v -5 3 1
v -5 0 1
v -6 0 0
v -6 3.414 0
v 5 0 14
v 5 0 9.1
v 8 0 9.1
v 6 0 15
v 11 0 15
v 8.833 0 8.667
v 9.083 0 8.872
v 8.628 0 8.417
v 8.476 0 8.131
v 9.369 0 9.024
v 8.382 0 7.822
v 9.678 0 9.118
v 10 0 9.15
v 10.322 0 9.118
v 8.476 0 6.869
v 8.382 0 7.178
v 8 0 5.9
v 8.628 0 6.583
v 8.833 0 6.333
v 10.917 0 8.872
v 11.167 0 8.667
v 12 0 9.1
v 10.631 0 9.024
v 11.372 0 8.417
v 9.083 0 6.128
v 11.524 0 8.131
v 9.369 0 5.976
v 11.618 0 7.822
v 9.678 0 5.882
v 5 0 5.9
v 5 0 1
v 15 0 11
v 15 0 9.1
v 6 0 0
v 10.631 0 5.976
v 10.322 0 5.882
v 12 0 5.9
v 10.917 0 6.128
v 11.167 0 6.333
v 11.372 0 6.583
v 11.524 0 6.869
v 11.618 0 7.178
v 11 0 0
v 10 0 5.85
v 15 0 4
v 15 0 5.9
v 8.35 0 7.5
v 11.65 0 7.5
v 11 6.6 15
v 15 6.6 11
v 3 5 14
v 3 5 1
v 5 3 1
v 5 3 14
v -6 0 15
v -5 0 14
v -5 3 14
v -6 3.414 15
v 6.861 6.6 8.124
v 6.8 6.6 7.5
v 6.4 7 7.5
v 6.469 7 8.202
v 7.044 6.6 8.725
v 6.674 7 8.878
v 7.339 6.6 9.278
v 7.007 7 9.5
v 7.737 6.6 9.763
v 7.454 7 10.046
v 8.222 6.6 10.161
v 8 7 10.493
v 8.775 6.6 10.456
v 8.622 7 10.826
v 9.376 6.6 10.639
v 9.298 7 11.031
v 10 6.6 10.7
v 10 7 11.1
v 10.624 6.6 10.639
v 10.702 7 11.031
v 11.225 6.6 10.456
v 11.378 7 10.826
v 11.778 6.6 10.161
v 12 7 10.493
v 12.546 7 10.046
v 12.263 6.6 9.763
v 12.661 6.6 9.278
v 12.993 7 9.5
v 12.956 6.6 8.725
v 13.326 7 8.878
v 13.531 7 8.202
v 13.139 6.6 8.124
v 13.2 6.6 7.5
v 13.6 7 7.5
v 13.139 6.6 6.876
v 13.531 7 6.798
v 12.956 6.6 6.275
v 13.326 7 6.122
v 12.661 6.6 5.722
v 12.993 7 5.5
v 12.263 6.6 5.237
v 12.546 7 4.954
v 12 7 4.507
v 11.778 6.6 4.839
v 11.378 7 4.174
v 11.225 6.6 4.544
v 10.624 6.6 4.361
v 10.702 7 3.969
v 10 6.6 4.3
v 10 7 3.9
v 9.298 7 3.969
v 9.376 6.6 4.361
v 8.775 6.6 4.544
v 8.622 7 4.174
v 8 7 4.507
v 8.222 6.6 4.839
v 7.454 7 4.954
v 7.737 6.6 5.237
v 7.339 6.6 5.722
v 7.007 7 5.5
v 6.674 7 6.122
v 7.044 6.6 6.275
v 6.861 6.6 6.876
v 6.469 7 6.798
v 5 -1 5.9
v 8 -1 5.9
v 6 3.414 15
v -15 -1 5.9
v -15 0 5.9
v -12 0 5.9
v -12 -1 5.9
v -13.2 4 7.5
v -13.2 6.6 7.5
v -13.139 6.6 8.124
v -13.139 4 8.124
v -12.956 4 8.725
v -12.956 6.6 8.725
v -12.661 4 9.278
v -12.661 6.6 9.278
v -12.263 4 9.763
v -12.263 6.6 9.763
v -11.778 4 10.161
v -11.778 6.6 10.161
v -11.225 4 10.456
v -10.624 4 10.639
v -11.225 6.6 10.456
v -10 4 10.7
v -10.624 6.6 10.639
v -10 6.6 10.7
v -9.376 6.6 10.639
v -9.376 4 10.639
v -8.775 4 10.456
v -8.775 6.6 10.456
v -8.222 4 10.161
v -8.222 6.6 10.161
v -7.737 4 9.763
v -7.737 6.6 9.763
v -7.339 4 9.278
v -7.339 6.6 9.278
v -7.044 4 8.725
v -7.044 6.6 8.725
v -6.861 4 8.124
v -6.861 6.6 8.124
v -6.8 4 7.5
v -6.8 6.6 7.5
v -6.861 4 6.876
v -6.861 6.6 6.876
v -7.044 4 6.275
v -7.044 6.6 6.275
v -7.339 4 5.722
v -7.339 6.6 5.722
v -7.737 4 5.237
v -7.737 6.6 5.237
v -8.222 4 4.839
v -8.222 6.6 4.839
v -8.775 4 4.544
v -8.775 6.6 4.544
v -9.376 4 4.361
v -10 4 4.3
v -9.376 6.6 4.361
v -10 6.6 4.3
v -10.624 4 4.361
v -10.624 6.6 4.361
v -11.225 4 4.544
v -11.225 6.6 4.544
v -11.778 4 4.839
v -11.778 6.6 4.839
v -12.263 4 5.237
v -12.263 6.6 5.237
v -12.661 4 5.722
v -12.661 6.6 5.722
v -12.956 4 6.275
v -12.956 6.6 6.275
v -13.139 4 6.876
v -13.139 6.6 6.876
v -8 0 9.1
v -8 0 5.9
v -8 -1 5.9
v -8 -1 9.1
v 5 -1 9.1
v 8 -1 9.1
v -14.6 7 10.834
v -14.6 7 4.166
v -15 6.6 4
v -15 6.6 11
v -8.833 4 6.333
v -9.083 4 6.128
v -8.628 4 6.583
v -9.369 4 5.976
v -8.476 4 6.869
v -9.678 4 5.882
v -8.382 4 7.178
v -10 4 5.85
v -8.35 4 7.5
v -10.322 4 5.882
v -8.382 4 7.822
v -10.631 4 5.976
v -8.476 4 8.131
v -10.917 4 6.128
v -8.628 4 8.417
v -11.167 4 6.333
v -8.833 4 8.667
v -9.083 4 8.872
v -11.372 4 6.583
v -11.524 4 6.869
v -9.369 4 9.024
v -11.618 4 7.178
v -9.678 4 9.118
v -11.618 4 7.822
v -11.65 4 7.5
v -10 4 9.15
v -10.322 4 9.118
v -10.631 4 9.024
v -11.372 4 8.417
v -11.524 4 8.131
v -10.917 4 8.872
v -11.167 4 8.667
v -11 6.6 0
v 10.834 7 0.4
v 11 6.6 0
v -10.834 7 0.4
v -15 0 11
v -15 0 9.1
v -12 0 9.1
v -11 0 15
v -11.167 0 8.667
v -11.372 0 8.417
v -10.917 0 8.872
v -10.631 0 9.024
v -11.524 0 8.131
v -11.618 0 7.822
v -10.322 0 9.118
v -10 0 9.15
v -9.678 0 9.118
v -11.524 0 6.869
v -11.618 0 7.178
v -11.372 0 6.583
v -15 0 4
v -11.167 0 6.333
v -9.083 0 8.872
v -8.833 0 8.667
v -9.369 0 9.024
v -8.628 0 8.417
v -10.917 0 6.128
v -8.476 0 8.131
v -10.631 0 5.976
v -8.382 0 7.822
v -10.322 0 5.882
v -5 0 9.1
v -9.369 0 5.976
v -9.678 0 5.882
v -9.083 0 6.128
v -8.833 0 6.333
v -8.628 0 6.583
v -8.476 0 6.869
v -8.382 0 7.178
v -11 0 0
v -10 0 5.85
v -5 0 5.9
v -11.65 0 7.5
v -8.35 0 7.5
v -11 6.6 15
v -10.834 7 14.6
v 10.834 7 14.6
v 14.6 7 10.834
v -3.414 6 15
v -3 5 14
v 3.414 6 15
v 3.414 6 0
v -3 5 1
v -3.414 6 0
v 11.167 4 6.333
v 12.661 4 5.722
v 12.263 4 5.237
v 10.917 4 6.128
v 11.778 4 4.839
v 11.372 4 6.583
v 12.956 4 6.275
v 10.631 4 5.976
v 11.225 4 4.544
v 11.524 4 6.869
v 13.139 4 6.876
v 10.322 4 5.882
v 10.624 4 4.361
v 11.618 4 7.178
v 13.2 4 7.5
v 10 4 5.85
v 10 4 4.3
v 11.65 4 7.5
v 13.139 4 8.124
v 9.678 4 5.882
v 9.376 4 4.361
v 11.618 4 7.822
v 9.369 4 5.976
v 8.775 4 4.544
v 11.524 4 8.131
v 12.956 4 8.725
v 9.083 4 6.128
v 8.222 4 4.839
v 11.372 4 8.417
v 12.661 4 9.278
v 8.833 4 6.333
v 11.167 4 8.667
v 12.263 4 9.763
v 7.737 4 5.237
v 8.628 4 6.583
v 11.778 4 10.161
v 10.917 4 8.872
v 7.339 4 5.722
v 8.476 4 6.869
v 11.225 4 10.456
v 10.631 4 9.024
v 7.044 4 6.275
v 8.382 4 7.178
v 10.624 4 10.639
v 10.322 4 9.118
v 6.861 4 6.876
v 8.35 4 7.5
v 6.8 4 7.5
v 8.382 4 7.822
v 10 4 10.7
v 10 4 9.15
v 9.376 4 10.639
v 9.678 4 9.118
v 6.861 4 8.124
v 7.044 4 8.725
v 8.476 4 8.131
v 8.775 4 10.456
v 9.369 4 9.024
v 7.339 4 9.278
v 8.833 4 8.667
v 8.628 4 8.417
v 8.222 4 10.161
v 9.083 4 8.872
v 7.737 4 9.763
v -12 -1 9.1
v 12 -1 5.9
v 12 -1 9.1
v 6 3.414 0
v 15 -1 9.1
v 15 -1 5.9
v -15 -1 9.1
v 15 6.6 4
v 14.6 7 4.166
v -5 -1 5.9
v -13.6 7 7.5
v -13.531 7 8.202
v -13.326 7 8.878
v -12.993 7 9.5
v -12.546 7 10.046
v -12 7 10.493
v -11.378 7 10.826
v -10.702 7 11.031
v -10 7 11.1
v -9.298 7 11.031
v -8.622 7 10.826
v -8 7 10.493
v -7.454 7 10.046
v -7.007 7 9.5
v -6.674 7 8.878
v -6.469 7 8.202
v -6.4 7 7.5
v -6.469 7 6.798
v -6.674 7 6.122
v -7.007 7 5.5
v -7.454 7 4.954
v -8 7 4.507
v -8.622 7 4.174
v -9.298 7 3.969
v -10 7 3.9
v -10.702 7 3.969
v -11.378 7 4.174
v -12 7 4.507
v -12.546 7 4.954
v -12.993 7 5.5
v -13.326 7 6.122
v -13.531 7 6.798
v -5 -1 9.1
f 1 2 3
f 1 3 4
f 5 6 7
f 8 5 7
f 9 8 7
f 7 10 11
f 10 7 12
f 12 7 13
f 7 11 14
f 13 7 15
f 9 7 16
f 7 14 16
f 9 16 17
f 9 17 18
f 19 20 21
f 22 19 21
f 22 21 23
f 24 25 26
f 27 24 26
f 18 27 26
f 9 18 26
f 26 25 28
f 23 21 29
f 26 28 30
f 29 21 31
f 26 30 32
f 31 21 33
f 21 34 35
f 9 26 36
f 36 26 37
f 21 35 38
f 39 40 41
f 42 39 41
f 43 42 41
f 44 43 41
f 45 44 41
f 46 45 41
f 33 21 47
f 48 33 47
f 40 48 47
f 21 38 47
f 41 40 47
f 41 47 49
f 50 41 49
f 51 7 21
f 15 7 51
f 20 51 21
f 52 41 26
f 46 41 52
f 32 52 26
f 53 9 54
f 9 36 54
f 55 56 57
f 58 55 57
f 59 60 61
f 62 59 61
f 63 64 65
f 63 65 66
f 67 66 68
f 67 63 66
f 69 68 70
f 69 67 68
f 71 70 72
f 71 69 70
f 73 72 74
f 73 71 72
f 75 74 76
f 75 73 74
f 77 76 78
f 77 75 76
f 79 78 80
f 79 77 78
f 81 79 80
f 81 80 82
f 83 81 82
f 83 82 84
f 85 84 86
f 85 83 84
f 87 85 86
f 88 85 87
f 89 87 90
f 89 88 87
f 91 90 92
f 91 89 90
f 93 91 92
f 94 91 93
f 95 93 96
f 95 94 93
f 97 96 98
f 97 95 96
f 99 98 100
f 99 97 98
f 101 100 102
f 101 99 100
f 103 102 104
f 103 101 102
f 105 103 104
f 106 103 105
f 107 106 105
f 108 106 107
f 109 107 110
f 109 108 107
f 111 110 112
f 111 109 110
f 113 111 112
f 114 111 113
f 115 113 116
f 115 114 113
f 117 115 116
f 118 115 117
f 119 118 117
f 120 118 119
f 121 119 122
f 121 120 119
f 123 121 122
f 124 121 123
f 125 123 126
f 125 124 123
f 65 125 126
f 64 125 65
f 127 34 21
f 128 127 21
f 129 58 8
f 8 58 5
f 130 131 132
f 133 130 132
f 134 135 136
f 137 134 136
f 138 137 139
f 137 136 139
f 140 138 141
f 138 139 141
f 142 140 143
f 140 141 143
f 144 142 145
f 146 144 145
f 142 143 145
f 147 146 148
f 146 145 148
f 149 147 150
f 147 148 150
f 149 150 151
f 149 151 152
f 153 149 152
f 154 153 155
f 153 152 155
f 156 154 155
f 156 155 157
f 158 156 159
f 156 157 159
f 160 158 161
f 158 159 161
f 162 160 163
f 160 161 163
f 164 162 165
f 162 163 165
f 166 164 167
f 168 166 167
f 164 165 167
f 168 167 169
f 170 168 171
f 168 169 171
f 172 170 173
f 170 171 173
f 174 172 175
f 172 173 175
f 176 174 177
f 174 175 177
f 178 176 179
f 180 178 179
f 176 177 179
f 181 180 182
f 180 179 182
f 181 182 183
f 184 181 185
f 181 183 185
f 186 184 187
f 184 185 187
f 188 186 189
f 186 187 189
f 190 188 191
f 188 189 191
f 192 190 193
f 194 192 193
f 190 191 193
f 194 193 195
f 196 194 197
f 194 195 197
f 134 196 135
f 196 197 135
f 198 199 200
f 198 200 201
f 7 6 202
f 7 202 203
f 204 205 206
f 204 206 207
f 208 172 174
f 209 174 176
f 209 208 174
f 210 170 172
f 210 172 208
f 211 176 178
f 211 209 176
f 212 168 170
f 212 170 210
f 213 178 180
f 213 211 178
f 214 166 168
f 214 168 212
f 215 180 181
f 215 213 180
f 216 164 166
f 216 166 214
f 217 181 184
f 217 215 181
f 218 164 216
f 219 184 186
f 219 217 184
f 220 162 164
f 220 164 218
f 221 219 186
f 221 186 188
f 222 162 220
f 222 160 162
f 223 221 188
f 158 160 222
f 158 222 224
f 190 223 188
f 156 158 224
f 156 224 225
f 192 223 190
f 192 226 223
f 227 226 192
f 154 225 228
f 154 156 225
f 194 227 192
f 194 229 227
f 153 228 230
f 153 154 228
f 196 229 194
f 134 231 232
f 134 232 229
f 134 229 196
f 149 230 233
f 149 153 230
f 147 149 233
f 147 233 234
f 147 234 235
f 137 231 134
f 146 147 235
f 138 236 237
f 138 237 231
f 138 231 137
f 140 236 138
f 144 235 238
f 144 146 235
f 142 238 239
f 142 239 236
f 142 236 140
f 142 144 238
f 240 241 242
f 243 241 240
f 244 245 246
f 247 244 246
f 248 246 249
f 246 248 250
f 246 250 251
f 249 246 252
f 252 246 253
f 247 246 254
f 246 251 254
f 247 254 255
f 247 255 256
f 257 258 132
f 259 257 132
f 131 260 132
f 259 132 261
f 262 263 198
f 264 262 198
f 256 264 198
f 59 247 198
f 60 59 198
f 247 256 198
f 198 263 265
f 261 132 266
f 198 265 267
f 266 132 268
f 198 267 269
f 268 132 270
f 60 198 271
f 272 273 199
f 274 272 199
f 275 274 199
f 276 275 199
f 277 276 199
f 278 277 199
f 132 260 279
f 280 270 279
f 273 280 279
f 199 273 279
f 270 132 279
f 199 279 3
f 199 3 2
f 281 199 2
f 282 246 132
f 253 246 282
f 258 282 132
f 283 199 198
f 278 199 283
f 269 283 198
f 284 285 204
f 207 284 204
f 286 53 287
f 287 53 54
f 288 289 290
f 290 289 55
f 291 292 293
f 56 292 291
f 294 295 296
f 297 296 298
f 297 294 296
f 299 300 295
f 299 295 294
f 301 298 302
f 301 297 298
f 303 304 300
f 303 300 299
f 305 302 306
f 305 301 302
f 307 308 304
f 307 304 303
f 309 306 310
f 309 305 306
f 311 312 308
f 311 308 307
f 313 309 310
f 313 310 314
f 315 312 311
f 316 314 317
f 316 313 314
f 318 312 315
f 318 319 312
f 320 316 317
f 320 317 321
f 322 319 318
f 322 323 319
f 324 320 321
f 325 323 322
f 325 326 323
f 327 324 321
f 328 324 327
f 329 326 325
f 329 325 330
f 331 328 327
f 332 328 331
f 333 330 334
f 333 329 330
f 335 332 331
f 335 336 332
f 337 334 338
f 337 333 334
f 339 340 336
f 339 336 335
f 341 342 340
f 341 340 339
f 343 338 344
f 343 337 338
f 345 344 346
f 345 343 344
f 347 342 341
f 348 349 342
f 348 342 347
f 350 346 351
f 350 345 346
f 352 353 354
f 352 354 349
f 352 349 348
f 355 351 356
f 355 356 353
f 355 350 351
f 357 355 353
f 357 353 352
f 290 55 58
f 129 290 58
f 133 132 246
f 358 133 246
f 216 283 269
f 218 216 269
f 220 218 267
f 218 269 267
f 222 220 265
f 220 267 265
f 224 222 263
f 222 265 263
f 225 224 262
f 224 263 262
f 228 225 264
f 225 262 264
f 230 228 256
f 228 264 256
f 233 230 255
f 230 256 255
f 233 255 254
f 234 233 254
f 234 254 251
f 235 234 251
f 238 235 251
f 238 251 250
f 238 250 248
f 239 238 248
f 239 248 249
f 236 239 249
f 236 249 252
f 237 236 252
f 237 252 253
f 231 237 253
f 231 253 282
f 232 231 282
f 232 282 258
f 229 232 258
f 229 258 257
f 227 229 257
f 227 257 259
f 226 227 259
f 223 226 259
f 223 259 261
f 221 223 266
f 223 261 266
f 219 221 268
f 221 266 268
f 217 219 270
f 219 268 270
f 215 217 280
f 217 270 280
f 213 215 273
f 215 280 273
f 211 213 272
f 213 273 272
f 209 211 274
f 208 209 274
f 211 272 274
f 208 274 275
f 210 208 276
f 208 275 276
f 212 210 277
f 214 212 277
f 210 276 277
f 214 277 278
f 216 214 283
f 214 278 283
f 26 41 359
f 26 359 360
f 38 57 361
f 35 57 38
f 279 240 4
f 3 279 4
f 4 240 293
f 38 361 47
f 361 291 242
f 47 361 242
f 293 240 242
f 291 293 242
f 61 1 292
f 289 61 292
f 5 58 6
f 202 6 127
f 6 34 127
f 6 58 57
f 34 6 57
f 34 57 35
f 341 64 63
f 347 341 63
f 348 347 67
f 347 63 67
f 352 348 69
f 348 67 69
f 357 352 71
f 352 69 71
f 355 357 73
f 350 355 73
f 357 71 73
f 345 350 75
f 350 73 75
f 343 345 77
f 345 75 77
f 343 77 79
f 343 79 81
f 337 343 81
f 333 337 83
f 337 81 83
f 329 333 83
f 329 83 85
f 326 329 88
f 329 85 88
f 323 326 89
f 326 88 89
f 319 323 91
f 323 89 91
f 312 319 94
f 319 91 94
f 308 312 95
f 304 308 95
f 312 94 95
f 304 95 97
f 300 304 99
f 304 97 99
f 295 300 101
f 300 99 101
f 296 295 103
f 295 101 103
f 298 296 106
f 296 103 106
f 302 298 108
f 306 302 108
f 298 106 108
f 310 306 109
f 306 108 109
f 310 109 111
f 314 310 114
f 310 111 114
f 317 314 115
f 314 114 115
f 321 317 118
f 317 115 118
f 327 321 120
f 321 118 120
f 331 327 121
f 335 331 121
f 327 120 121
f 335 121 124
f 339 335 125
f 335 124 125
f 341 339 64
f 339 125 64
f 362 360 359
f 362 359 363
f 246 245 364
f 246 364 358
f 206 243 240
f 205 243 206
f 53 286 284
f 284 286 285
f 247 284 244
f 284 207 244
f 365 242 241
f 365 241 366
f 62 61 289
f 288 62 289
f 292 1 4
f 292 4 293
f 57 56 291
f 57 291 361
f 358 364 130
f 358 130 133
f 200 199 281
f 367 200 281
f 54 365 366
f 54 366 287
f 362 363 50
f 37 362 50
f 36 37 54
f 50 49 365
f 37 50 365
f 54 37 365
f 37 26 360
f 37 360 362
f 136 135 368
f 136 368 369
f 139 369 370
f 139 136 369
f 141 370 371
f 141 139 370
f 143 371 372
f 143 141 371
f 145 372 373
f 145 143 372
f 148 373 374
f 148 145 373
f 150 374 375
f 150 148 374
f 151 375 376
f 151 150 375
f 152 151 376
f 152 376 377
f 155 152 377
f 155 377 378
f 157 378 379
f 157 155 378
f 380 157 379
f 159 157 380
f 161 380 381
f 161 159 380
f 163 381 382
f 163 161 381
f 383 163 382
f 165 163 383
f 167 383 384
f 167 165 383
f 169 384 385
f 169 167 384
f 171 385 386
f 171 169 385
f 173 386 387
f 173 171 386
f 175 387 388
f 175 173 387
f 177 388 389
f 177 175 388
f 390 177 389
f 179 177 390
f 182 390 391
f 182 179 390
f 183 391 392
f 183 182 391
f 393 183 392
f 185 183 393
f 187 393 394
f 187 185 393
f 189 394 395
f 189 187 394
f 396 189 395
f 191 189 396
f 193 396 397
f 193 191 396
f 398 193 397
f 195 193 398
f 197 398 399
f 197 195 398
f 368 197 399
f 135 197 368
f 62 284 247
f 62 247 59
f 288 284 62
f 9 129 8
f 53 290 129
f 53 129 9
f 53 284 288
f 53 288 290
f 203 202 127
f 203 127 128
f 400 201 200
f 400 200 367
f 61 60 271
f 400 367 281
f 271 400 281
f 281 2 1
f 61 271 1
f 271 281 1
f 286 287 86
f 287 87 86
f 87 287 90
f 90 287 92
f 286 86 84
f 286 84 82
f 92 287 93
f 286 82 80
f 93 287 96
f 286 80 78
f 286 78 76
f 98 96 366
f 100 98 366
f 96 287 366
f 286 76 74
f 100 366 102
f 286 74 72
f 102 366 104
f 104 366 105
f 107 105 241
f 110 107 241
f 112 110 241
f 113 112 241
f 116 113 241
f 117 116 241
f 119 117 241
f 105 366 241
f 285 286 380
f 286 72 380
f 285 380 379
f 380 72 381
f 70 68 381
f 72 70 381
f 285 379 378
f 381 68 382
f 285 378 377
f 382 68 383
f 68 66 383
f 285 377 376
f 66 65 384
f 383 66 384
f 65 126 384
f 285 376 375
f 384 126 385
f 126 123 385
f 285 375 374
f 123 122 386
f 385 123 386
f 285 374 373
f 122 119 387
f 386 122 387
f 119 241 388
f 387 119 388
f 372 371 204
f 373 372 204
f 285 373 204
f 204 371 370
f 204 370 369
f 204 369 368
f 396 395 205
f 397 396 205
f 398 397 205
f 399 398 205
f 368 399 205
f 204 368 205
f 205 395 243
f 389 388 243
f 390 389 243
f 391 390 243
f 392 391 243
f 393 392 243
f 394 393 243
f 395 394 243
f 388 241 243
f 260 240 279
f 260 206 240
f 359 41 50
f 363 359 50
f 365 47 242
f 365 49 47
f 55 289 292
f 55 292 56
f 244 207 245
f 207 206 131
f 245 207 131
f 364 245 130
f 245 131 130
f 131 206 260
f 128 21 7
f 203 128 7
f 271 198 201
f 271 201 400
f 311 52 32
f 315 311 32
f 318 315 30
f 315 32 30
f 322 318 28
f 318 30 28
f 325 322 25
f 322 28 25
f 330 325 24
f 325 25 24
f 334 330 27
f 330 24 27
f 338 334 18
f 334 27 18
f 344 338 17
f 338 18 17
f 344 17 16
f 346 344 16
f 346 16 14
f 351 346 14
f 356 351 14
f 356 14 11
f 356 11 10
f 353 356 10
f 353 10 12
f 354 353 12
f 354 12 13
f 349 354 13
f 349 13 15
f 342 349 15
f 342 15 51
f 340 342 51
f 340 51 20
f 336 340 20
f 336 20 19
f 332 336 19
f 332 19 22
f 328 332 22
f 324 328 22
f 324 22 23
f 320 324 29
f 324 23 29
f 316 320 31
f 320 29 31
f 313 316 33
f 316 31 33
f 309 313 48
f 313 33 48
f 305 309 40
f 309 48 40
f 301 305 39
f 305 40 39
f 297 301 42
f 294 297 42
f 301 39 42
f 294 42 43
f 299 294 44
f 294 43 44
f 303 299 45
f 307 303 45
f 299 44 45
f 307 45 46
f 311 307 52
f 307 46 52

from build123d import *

# Parameters (mm, degrees)
PAD001_DEPTH                               = 15
SKETCH007_R                                = 1.65
POCKET005_DEPTH                            = 7.001
SKETCH008_R                                = 3.2
POCKET006_DEPTH                            = 3
CHAMFER004013007011015006009007001025_SIZE = 4
CHAMFER004013007011015006009007001026_SIZE = 0.4
CHAMFER004013007011015006009007001027_SIZE = 1
SKETCH009_W                                = 3
SKETCH009_H                                = 3.2
PAD002_DEPTH                               = 1


with BuildPart() as part:
    # Sketch006 → Pad001 (new body)
    with BuildSketch(Plane.XY):
        Polygon((-5, 0), (-5, 3), (-3, 5), (3, 5), (5, 3), (5, 0), (15, 0), (15, 5), (15, 7), (-15, 7), (-15, 6), (-15, 0), align=None)
    extrude(amount=PAD001_DEPTH)

    # Sketch007 (on Face12 of Pad001) → Pocket005 (cut, through all)
    with BuildSketch(Plane.XZ):
        with Locations((-10, 7.5)):
            Circle(SKETCH007_R)
        with Locations((10, 7.5)):
            Circle(SKETCH007_R)
    extrude(amount=-POCKET005_DEPTH, mode=Mode.SUBTRACT)

    # Sketch008 (on Face14 of Pocket005) → Pocket006 (cut)
    with BuildSketch(Plane(origin=(0, 7, 0), x_dir=(-1, 0, 0), z_dir=(0, 1, 0))):
        with Locations((-10, 7.5)):
            Circle(SKETCH008_R)
        with Locations((10, 7.5)):
            Circle(SKETCH008_R)
    extrude(amount=-POCKET006_DEPTH, mode=Mode.SUBTRACT)

    # Chamfer004013007011015006009007001025
    chamfer004013007011015006009007001025_edges = [part.edges().sort_by_distance(p)[0] for p in [
        (15, 2.5, 15),
        (15, 2.5, 0),
        (15, 6, 0),
        (15, 6, 15),
        (-15, 3, 15),
        (-15, 6.5, 15),
        (-15, 6.5, 0),
        (-15, 3, 0),
    ]]
    chamfer(chamfer004013007011015006009007001025_edges, length=CHAMFER004013007011015006009007001025_SIZE)

    # Chamfer004013007011015006009007001026
    chamfer004013007011015006009007001026_edges = [part.edges().sort_by_distance(p)[0] for p in [
        (-15, 7, 7.5),
        (-13, 7, 2),
        (-13, 7, 13),
        (0, 7, 0),
        (0, 7, 15),
        (13, 7, 2),
        (13, 7, 13),
        (15, 7, 7.5),
        (-6.8, 7, 7.5),
        (13.2, 7, 7.5),
    ]]
    chamfer(chamfer004013007011015006009007001026_edges, length=CHAMFER004013007011015006009007001026_SIZE)

    # Chamfer004013007011015006009007001027
    chamfer004013007011015006009007001027_edges = [part.edges().sort_by_distance(p)[0] for p in [
        (-5, 1.5, 15),
        (-4, 4, 15),
        (0, 5, 15),
        (4, 4, 15),
        (5, 1.5, 15),
        (-5, 1.5, 0),
        (-4, 4, 0),
        (0, 5, 0),
        (4, 4, 0),
        (5, 1.5, 0),
    ]]
    chamfer(chamfer004013007011015006009007001027_edges, length=CHAMFER004013007011015006009007001027_SIZE)

    # Sketch009 (on Face13 of Chamfer004013007011015006009007001027) → Pad002 (join)
    with BuildSketch(Plane.XZ):
        with Locations((-13.5, 7.5)):
            Rectangle(SKETCH009_W, SKETCH009_H)
        with Locations((-6.5, 7.5)):
            Rectangle(SKETCH009_W, SKETCH009_H)
        with Locations((6.5, 7.5)):
            Rectangle(SKETCH009_W, SKETCH009_H)
        with Locations((13.5, 7.5)):
            Rectangle(SKETCH009_W, SKETCH009_H)
    extrude(amount=PAD002_DEPTH)


solid = part.part
